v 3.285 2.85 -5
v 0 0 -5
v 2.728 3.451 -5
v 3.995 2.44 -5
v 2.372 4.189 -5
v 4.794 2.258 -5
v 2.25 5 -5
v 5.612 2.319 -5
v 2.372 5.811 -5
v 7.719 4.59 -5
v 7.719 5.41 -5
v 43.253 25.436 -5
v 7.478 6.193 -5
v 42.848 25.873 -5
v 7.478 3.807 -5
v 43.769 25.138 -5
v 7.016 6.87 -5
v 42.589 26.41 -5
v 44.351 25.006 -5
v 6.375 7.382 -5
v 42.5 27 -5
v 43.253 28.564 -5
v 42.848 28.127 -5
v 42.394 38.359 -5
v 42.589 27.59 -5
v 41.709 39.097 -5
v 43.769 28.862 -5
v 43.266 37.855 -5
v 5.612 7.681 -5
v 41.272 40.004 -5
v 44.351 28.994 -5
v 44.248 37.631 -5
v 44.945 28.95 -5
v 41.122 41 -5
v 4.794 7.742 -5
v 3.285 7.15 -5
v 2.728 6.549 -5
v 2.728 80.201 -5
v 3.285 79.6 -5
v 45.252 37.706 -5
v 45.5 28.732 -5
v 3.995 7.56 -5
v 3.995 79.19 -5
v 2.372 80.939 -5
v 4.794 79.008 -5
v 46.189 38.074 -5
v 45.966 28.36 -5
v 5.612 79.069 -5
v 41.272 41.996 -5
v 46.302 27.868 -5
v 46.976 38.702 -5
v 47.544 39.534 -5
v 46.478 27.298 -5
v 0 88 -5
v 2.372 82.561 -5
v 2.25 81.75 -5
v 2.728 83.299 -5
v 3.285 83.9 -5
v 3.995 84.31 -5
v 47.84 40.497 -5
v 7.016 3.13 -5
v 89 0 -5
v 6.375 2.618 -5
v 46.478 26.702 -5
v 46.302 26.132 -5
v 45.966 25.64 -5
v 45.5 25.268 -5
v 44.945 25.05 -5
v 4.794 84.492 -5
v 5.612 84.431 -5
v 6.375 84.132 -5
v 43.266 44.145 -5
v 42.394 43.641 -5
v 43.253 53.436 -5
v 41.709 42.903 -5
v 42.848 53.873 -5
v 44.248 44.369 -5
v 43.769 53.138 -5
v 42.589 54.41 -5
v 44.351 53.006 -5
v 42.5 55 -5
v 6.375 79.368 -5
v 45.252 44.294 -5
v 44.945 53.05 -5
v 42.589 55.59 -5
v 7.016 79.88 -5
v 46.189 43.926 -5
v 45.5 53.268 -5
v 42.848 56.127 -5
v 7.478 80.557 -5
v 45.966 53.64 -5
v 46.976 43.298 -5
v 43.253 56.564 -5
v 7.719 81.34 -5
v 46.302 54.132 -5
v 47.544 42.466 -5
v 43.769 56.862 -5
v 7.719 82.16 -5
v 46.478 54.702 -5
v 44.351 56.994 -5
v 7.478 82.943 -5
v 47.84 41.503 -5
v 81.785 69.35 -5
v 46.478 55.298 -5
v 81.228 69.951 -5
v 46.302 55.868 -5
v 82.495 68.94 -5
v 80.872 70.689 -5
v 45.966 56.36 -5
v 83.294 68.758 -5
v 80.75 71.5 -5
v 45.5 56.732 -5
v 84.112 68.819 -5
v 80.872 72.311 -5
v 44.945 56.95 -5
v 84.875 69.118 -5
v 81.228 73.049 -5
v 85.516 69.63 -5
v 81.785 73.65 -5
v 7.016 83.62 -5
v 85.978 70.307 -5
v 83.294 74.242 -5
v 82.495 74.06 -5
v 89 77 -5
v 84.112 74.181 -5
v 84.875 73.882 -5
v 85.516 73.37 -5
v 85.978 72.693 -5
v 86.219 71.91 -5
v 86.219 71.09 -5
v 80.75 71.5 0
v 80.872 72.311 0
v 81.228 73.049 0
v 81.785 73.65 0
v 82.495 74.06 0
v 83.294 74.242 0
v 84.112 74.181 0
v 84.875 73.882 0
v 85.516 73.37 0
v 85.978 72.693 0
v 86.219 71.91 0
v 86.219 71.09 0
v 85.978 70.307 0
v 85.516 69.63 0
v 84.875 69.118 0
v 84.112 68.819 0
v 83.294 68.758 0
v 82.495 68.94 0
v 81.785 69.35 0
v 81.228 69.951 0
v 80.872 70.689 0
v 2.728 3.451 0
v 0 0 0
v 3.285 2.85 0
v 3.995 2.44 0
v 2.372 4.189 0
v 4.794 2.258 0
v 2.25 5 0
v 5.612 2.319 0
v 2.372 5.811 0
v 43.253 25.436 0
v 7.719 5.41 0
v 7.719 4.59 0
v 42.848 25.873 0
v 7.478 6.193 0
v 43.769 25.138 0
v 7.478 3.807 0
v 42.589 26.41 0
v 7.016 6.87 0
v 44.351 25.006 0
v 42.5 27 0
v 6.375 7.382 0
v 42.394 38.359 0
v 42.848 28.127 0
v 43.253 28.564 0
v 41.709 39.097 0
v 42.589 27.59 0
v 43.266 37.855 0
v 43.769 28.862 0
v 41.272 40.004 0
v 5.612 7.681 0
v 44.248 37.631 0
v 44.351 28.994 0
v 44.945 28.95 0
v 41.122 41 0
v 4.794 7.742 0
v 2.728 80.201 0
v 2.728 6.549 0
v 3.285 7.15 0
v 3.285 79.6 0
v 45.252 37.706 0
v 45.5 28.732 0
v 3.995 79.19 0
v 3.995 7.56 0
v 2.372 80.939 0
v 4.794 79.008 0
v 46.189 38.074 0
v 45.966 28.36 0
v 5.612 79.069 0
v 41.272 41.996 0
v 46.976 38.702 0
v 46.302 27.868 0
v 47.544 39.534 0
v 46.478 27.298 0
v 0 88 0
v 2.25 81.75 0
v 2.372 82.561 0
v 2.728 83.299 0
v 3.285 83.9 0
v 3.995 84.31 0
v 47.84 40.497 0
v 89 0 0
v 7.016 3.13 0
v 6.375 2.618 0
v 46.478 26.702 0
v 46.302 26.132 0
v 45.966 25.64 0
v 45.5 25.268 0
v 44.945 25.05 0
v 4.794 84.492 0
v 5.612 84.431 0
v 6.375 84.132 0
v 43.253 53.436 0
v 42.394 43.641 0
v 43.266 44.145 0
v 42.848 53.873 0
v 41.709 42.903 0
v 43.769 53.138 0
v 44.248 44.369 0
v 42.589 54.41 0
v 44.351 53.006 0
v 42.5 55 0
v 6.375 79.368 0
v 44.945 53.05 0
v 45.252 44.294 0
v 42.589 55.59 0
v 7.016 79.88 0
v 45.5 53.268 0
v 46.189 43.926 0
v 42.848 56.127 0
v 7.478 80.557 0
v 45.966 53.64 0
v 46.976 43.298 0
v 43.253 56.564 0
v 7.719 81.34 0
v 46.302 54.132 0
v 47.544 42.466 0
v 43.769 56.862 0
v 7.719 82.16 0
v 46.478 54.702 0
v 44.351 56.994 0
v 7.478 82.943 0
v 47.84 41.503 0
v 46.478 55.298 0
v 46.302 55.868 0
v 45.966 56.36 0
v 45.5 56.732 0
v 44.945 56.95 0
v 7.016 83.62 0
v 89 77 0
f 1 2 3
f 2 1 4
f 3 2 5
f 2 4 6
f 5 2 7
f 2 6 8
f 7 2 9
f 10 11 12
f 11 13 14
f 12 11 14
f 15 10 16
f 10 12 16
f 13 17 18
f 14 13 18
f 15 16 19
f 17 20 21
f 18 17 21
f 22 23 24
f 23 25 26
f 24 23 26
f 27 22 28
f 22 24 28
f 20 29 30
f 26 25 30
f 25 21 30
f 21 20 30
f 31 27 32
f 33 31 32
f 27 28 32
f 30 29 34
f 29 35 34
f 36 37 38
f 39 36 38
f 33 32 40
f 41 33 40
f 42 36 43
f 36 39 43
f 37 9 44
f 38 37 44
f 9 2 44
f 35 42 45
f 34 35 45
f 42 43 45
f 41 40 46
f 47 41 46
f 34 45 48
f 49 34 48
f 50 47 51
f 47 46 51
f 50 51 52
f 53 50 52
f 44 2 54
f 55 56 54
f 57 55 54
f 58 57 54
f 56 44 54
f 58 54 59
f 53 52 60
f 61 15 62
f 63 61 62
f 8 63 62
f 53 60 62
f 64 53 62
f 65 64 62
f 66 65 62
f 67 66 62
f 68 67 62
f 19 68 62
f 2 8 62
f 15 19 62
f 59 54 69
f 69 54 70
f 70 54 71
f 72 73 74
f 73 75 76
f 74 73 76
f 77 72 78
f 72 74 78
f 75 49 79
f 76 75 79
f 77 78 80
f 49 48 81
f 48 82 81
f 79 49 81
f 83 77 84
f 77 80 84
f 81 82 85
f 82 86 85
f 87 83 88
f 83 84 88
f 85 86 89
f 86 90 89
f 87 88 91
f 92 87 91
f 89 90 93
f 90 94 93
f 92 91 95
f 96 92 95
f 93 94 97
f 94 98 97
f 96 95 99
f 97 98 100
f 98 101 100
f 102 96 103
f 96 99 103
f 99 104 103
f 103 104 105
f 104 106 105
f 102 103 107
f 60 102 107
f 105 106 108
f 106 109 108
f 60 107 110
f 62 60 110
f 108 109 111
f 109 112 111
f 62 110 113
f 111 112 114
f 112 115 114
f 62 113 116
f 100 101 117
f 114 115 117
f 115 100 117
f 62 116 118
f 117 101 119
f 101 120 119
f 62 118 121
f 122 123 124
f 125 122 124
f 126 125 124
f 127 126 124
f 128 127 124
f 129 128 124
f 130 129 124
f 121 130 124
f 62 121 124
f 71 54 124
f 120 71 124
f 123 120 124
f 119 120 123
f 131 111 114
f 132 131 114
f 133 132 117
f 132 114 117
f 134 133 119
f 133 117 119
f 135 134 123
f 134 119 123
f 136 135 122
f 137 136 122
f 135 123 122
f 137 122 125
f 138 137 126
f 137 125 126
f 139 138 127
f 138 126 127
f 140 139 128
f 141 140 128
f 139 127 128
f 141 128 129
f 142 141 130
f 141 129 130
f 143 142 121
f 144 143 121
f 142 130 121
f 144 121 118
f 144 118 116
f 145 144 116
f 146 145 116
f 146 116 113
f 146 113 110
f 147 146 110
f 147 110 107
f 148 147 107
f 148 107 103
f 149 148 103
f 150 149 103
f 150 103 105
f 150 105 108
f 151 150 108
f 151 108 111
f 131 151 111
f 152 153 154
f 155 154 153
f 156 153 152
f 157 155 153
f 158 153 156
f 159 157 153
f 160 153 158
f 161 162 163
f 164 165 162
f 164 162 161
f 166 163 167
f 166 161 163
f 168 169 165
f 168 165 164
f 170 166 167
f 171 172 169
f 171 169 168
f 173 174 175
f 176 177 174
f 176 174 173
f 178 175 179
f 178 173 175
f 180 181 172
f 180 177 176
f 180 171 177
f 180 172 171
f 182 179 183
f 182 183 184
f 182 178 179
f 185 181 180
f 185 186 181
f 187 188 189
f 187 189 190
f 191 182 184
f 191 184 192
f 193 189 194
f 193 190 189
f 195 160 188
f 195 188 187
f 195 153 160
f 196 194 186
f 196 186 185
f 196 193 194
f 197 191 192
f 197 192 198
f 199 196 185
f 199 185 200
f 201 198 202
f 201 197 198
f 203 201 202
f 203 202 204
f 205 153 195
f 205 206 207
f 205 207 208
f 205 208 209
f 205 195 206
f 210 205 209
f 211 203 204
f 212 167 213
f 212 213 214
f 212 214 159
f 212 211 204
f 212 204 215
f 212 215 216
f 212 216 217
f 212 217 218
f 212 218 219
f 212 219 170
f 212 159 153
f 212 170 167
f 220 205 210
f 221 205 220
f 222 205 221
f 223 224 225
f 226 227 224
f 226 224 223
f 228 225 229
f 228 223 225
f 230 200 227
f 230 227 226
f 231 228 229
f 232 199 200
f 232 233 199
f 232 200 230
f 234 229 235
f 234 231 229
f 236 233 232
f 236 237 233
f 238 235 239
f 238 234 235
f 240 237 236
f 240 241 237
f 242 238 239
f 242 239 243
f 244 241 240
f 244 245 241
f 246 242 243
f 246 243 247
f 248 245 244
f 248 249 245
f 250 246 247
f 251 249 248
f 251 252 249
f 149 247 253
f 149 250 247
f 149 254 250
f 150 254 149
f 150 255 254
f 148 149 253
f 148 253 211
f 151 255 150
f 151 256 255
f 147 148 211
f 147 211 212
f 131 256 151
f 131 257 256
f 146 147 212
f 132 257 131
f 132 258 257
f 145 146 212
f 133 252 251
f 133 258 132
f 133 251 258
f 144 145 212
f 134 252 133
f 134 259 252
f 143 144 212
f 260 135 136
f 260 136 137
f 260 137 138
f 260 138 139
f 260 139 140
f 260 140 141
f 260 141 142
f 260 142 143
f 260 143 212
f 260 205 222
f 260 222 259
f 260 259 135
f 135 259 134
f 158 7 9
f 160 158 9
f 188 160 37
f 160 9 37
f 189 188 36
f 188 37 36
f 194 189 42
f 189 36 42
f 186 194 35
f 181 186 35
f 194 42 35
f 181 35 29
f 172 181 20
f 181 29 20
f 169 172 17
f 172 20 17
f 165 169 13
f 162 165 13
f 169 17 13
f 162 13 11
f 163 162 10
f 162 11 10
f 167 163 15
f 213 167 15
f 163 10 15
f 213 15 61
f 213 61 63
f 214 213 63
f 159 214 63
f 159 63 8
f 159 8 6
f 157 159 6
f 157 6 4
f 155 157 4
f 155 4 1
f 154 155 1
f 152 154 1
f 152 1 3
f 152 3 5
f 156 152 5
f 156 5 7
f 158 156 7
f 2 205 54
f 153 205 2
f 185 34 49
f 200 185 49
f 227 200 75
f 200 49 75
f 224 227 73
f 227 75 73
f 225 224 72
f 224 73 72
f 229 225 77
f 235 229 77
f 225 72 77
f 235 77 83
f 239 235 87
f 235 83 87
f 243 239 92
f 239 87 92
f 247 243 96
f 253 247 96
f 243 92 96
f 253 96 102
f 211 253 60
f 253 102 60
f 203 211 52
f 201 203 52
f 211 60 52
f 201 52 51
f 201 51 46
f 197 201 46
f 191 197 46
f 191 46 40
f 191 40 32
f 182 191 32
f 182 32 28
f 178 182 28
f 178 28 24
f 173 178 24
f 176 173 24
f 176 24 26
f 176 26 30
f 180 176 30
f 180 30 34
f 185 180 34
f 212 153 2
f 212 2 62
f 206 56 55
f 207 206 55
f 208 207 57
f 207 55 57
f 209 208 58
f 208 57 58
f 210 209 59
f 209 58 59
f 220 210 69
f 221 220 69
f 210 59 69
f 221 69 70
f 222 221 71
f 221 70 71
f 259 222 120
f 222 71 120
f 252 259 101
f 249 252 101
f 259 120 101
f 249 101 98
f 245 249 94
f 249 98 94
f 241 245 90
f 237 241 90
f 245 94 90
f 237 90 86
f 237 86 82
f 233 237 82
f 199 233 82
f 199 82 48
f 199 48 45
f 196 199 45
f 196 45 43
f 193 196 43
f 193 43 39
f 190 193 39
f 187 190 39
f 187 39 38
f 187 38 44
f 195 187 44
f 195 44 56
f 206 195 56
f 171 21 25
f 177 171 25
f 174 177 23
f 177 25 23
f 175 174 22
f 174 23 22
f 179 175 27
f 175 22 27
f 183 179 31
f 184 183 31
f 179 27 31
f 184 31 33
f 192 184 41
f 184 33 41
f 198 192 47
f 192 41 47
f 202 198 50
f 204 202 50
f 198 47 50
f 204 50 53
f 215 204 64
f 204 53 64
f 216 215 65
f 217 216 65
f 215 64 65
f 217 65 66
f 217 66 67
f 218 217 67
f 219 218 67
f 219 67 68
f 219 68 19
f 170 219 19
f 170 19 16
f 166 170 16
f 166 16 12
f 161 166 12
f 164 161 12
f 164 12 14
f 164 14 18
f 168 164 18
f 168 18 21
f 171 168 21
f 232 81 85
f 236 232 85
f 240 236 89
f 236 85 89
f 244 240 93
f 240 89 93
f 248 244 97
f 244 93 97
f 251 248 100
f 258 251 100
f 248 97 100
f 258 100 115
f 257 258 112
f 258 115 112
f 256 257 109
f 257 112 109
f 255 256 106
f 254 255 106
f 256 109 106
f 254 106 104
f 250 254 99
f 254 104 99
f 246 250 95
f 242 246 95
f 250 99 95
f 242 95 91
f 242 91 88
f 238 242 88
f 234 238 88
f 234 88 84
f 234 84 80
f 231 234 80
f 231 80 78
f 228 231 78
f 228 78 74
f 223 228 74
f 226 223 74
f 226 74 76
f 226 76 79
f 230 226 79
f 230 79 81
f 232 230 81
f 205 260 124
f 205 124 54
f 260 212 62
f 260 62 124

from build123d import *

# Parameters (mm, degrees)
F1_DEPTH = 5
F3_D     = 5.5
F5_D     = 6.7564
F7_D     = 4


with BuildPart() as f1:
    # F0 (on Top) → F1 (new body)
    with BuildSketch(Plane.XY):
        Polygon((0, 88), (0, 0), (89, 0), (89, 77), align=None)
    extrude(amount=-F1_DEPTH)

    # F3 (through all)
    with Locations(Plane.XY):
        with Locations((5, 5), (5, 81.75), (83.5, 71.5)):
            Hole(F3_D / 2)

    # F5 (through all)
    with Locations(Plane.XY):
        with Locations((44.5, 41)):
            Hole(F5_D / 2)

    # F7 (through all)
    with Locations(Plane.XY):
        with Locations((44.5, 55), (44.5, 27)):
            Hole(F7_D / 2)


solid = f1.part
